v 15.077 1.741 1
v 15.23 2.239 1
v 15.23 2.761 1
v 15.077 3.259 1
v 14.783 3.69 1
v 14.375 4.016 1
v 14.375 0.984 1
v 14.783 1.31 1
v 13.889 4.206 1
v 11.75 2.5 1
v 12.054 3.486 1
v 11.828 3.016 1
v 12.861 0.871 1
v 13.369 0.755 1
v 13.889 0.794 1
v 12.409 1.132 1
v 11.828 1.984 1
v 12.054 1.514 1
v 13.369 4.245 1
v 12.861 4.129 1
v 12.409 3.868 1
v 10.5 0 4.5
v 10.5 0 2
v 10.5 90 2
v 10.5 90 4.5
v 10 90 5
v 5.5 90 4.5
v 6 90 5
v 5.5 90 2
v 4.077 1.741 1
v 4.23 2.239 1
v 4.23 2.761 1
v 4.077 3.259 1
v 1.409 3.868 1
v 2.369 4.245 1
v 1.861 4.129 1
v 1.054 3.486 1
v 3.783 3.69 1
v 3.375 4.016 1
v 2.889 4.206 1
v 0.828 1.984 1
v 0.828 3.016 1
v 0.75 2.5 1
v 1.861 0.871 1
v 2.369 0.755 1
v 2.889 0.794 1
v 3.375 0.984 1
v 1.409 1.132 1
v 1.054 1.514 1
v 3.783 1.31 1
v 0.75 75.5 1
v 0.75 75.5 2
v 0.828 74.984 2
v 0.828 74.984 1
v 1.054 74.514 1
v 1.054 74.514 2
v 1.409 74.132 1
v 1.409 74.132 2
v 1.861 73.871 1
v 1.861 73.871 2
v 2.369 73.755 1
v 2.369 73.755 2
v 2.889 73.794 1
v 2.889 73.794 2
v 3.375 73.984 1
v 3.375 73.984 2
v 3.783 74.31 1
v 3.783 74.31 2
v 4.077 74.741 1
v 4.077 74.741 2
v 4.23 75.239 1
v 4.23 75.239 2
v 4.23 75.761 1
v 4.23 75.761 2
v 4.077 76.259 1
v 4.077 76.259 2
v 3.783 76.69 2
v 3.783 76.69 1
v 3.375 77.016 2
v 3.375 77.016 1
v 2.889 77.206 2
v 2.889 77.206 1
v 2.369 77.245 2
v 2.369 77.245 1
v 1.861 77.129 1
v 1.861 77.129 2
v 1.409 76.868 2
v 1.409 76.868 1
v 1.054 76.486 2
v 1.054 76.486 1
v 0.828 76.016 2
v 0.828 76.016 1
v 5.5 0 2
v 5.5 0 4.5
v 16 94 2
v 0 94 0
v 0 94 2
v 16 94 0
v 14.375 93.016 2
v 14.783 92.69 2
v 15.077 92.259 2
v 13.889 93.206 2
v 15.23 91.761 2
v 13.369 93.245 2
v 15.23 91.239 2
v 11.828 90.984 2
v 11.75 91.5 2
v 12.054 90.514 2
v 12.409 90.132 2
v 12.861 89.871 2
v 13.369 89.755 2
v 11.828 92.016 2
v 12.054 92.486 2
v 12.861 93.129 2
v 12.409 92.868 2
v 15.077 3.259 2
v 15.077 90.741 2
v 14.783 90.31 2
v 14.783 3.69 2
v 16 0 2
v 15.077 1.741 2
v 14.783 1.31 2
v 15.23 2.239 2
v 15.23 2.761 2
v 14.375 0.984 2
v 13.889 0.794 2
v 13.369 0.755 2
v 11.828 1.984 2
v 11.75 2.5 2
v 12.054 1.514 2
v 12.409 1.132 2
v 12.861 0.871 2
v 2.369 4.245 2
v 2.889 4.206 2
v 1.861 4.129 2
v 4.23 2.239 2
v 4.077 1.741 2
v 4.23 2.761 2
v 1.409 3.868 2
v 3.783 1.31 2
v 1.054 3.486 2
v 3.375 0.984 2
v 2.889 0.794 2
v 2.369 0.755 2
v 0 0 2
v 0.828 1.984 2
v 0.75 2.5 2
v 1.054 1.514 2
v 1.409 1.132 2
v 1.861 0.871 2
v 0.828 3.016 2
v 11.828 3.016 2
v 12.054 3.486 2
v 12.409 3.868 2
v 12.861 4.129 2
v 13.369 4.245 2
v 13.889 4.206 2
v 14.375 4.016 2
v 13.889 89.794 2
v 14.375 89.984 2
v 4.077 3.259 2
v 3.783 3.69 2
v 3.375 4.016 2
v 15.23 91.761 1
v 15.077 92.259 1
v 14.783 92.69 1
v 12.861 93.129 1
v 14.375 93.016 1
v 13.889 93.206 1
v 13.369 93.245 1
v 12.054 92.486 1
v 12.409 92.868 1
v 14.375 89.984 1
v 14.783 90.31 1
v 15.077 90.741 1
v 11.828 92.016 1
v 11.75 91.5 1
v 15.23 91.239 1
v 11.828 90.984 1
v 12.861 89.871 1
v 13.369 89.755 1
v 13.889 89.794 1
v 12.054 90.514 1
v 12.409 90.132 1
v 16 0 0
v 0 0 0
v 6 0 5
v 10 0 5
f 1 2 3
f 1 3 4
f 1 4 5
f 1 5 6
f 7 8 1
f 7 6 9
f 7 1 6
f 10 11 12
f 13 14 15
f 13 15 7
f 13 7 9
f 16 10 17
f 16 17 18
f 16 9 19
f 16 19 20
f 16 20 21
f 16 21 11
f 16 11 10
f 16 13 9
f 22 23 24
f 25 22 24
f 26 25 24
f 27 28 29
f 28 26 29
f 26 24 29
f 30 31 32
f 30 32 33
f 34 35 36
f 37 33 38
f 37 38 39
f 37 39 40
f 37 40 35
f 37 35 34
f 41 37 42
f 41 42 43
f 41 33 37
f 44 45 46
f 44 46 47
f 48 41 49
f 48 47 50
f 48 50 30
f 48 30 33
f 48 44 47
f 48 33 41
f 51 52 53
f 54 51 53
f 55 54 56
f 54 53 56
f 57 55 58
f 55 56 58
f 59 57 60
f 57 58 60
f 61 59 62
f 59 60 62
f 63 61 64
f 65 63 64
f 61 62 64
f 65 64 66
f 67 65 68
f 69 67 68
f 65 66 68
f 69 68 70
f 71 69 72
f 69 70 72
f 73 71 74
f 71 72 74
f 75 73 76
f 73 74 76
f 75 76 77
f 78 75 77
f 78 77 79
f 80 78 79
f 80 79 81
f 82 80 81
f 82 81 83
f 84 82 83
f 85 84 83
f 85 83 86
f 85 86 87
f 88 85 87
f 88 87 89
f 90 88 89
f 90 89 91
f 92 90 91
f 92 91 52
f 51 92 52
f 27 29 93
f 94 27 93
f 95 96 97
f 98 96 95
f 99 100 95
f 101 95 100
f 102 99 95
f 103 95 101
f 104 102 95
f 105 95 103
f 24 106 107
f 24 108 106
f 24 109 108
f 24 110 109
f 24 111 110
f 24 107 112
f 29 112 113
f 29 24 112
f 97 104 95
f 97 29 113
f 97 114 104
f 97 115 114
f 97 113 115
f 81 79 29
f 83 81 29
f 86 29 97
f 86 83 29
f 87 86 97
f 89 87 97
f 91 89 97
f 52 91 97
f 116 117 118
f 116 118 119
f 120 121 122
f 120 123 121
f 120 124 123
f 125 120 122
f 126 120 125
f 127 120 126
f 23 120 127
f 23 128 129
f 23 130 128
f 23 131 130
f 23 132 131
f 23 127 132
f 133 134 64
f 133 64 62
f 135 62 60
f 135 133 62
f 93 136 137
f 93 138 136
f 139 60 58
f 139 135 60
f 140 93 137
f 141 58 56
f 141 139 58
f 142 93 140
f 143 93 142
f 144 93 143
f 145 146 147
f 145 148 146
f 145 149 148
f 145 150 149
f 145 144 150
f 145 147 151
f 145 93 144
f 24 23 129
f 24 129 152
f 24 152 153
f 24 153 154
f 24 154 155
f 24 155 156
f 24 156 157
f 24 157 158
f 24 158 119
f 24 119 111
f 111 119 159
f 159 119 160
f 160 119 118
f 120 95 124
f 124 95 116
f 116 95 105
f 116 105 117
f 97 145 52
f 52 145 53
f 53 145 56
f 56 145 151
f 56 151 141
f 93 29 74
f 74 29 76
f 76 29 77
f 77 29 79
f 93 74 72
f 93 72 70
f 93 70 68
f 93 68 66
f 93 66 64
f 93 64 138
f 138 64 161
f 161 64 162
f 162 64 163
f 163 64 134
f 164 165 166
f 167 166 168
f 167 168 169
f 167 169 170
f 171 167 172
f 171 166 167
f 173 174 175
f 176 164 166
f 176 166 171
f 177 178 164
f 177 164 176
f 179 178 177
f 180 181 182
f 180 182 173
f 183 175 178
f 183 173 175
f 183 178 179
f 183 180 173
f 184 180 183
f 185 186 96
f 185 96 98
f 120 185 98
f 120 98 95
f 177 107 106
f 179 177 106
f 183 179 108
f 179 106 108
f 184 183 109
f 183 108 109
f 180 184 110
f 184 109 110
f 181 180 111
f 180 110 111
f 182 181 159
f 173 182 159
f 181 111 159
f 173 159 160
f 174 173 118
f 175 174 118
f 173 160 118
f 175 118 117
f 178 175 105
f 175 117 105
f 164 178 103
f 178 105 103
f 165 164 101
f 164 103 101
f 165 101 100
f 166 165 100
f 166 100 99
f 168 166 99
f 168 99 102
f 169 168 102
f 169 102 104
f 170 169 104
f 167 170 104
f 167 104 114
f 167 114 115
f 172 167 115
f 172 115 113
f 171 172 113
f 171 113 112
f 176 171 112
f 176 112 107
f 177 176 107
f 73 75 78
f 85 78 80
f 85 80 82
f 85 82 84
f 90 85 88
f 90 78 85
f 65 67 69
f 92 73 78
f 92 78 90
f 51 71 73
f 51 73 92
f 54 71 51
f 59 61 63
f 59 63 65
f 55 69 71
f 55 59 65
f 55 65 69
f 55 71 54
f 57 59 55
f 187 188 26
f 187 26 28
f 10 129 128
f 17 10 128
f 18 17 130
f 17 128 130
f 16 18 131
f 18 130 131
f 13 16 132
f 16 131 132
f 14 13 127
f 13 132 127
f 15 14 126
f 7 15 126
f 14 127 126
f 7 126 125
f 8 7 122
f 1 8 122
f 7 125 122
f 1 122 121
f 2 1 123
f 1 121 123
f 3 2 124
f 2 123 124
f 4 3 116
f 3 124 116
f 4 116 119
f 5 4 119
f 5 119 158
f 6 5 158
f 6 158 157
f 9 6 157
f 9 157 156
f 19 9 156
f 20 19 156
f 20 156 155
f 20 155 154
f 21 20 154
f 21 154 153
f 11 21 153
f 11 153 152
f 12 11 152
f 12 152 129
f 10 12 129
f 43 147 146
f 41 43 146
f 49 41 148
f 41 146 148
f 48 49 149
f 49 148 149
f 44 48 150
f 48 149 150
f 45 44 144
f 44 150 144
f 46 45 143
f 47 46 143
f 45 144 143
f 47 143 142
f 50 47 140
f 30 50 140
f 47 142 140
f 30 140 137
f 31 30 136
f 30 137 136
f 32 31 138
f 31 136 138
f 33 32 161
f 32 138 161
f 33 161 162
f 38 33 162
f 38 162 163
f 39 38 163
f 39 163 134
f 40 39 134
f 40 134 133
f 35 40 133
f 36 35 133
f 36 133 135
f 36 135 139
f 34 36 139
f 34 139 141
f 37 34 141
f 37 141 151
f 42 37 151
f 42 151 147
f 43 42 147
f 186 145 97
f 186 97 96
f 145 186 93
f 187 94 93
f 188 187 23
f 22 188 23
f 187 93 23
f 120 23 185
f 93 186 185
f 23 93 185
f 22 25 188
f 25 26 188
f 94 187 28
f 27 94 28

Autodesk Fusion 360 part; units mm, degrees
sketch "3D-printed conduit top outline" plane through (0, 0, 0) normal (0, 1, 0) x (1, 0, 0)
  line L0 (0, 0) -> (16, 0)
  line L1 (16, 0) -> (16, -2)
  line L2 (16, -2) -> (0, -2)
  line L3 (0, -2) -> (0, 0)
  dimension "d7" = 16
  dimension "d8" = 2
extrude "Extrude1" add sketch "3D-printed conduit top outline" along normal blind 94
sketch "Magnet holes" plane through (0, 0, 2) normal (0, 0, 1) x (-1, 0, 0)
  line L0 (0, 0) -> (-16, 0)
  line L1 (-16, 0) -> (-16, -94)
  line L2 (-16, -94) -> (0, -94)
  line L3 (0, -94) -> (0, 0)
  circle A0 centre (-2.5, -2.5) radius 2.5
  circle A1 centre (-13.5, -2.5) radius 2.5
  circle A2 centre (-2.5, -2.5) radius 1.75
  circle A3 centre (-13.5, -2.5) radius 1.75
  circle A4 centre (-2.5, -75.5) radius 1.75
  circle A5 centre (-2.5, -75.5) radius 2.5
  circle A6 centre (-13.5, -91.5) radius 2.5
  circle A7 centre (-13.5, -91.5) radius 1.75
  dimension "d11" = 5
  dimension "d12" = 5
  dimension "d13" = 3.5
  dimension "d14" = 3.5
  dimension "d17" = 0
  dimension "d18" = -73
  dimension "d32" = 0
  dimension "d33" = -89
extrude "Extrude4" cut sketch "Magnet holes" against normal blind 1 contours A2 | A3 | A4 | A7
sketch "Support rib" plane through (0, 0, 2) normal (0, 0, 1) x (-1, 0, 0)
  circle A0 centre (-13.5, -2.5) radius 1.75
  circle A1 centre (-2.5, -75.5) radius 1.75
  circle A2 centre (-2.5, -2.5) radius 1.75
  circle A3 centre (-13.5, -91.5) radius 1.75
  line L0 (0, 0) -> (-16, 0)
  line L1 (-16, 0) -> (-16, -94)
  line L2 (-16, -94) -> (0, -94)
  line L3 (0, -94) -> (0, 0)
  line L4 (-5.5, 0) -> (-10.5, 0)
  line L5 (-10.5, 0) -> (-10.5, -90)
  line L6 (-10.5, -90) -> (-5.5, -90)
  line L7 (-5.5, -90) -> (-5.5, 0)
  dimension "d36" = 5
  dimension "d37" = 5.5
  dimension "d38" = 5.5
  dimension "d39" = 4
extrude "Extrude3" add sketch "Support rib" along normal blind 3 contours L0 L4 L5 L6 L7
chamfer "Chamfer2" distance 0.5 angle 45 2 edges at (10.5, 45, 5) (5.5, 45, 5)
equation "conduit_length = 94 mm"
equation "conduit_width = 16 mm"
equation "conduit_wall_thickness = 2 mm"
equation "magnet_diameter = 3 mm"
equation "magnet_height = 1 mm"
equation "number_of_magnets_on_a_side = 2"
equation "d7 = conduit_width"
equation "d8 = conduit_wall_thickness"
equation "d9 = conduit_length"
equation "d11 = magnet_diameter + 2 mm"
equation "d12 = magnet_diameter + 2 mm"
equation "d13 = magnet_diameter + 0.5 mm"
equation "d14 = magnet_diameter + 0.5 mm"
equation "d16 = number_of_magnets_on_a_side"
equation "d18 = -conduit_length + ( magnet_diameter + 2 mm ) + ( conduit_width )"
equation "rib_width = 5 mm"
equation "rib_height = 3 mm"
equation "d26 = rib_height"
equation "rib_chamfer = 0.5 mm"
equation "d31 = number_of_magnets_on_a_side"
equation "d33 = -conduit_length + ( magnet_diameter + 2 mm )"
equation "d34 = -magnet_height"
equation "d36 = rib_width"
equation "d37 = ( conduit_width - rib_width ) / 2"
equation "d39 = 2 * conduit_wall_thickness"
equation "d40 = rib_chamfer"
